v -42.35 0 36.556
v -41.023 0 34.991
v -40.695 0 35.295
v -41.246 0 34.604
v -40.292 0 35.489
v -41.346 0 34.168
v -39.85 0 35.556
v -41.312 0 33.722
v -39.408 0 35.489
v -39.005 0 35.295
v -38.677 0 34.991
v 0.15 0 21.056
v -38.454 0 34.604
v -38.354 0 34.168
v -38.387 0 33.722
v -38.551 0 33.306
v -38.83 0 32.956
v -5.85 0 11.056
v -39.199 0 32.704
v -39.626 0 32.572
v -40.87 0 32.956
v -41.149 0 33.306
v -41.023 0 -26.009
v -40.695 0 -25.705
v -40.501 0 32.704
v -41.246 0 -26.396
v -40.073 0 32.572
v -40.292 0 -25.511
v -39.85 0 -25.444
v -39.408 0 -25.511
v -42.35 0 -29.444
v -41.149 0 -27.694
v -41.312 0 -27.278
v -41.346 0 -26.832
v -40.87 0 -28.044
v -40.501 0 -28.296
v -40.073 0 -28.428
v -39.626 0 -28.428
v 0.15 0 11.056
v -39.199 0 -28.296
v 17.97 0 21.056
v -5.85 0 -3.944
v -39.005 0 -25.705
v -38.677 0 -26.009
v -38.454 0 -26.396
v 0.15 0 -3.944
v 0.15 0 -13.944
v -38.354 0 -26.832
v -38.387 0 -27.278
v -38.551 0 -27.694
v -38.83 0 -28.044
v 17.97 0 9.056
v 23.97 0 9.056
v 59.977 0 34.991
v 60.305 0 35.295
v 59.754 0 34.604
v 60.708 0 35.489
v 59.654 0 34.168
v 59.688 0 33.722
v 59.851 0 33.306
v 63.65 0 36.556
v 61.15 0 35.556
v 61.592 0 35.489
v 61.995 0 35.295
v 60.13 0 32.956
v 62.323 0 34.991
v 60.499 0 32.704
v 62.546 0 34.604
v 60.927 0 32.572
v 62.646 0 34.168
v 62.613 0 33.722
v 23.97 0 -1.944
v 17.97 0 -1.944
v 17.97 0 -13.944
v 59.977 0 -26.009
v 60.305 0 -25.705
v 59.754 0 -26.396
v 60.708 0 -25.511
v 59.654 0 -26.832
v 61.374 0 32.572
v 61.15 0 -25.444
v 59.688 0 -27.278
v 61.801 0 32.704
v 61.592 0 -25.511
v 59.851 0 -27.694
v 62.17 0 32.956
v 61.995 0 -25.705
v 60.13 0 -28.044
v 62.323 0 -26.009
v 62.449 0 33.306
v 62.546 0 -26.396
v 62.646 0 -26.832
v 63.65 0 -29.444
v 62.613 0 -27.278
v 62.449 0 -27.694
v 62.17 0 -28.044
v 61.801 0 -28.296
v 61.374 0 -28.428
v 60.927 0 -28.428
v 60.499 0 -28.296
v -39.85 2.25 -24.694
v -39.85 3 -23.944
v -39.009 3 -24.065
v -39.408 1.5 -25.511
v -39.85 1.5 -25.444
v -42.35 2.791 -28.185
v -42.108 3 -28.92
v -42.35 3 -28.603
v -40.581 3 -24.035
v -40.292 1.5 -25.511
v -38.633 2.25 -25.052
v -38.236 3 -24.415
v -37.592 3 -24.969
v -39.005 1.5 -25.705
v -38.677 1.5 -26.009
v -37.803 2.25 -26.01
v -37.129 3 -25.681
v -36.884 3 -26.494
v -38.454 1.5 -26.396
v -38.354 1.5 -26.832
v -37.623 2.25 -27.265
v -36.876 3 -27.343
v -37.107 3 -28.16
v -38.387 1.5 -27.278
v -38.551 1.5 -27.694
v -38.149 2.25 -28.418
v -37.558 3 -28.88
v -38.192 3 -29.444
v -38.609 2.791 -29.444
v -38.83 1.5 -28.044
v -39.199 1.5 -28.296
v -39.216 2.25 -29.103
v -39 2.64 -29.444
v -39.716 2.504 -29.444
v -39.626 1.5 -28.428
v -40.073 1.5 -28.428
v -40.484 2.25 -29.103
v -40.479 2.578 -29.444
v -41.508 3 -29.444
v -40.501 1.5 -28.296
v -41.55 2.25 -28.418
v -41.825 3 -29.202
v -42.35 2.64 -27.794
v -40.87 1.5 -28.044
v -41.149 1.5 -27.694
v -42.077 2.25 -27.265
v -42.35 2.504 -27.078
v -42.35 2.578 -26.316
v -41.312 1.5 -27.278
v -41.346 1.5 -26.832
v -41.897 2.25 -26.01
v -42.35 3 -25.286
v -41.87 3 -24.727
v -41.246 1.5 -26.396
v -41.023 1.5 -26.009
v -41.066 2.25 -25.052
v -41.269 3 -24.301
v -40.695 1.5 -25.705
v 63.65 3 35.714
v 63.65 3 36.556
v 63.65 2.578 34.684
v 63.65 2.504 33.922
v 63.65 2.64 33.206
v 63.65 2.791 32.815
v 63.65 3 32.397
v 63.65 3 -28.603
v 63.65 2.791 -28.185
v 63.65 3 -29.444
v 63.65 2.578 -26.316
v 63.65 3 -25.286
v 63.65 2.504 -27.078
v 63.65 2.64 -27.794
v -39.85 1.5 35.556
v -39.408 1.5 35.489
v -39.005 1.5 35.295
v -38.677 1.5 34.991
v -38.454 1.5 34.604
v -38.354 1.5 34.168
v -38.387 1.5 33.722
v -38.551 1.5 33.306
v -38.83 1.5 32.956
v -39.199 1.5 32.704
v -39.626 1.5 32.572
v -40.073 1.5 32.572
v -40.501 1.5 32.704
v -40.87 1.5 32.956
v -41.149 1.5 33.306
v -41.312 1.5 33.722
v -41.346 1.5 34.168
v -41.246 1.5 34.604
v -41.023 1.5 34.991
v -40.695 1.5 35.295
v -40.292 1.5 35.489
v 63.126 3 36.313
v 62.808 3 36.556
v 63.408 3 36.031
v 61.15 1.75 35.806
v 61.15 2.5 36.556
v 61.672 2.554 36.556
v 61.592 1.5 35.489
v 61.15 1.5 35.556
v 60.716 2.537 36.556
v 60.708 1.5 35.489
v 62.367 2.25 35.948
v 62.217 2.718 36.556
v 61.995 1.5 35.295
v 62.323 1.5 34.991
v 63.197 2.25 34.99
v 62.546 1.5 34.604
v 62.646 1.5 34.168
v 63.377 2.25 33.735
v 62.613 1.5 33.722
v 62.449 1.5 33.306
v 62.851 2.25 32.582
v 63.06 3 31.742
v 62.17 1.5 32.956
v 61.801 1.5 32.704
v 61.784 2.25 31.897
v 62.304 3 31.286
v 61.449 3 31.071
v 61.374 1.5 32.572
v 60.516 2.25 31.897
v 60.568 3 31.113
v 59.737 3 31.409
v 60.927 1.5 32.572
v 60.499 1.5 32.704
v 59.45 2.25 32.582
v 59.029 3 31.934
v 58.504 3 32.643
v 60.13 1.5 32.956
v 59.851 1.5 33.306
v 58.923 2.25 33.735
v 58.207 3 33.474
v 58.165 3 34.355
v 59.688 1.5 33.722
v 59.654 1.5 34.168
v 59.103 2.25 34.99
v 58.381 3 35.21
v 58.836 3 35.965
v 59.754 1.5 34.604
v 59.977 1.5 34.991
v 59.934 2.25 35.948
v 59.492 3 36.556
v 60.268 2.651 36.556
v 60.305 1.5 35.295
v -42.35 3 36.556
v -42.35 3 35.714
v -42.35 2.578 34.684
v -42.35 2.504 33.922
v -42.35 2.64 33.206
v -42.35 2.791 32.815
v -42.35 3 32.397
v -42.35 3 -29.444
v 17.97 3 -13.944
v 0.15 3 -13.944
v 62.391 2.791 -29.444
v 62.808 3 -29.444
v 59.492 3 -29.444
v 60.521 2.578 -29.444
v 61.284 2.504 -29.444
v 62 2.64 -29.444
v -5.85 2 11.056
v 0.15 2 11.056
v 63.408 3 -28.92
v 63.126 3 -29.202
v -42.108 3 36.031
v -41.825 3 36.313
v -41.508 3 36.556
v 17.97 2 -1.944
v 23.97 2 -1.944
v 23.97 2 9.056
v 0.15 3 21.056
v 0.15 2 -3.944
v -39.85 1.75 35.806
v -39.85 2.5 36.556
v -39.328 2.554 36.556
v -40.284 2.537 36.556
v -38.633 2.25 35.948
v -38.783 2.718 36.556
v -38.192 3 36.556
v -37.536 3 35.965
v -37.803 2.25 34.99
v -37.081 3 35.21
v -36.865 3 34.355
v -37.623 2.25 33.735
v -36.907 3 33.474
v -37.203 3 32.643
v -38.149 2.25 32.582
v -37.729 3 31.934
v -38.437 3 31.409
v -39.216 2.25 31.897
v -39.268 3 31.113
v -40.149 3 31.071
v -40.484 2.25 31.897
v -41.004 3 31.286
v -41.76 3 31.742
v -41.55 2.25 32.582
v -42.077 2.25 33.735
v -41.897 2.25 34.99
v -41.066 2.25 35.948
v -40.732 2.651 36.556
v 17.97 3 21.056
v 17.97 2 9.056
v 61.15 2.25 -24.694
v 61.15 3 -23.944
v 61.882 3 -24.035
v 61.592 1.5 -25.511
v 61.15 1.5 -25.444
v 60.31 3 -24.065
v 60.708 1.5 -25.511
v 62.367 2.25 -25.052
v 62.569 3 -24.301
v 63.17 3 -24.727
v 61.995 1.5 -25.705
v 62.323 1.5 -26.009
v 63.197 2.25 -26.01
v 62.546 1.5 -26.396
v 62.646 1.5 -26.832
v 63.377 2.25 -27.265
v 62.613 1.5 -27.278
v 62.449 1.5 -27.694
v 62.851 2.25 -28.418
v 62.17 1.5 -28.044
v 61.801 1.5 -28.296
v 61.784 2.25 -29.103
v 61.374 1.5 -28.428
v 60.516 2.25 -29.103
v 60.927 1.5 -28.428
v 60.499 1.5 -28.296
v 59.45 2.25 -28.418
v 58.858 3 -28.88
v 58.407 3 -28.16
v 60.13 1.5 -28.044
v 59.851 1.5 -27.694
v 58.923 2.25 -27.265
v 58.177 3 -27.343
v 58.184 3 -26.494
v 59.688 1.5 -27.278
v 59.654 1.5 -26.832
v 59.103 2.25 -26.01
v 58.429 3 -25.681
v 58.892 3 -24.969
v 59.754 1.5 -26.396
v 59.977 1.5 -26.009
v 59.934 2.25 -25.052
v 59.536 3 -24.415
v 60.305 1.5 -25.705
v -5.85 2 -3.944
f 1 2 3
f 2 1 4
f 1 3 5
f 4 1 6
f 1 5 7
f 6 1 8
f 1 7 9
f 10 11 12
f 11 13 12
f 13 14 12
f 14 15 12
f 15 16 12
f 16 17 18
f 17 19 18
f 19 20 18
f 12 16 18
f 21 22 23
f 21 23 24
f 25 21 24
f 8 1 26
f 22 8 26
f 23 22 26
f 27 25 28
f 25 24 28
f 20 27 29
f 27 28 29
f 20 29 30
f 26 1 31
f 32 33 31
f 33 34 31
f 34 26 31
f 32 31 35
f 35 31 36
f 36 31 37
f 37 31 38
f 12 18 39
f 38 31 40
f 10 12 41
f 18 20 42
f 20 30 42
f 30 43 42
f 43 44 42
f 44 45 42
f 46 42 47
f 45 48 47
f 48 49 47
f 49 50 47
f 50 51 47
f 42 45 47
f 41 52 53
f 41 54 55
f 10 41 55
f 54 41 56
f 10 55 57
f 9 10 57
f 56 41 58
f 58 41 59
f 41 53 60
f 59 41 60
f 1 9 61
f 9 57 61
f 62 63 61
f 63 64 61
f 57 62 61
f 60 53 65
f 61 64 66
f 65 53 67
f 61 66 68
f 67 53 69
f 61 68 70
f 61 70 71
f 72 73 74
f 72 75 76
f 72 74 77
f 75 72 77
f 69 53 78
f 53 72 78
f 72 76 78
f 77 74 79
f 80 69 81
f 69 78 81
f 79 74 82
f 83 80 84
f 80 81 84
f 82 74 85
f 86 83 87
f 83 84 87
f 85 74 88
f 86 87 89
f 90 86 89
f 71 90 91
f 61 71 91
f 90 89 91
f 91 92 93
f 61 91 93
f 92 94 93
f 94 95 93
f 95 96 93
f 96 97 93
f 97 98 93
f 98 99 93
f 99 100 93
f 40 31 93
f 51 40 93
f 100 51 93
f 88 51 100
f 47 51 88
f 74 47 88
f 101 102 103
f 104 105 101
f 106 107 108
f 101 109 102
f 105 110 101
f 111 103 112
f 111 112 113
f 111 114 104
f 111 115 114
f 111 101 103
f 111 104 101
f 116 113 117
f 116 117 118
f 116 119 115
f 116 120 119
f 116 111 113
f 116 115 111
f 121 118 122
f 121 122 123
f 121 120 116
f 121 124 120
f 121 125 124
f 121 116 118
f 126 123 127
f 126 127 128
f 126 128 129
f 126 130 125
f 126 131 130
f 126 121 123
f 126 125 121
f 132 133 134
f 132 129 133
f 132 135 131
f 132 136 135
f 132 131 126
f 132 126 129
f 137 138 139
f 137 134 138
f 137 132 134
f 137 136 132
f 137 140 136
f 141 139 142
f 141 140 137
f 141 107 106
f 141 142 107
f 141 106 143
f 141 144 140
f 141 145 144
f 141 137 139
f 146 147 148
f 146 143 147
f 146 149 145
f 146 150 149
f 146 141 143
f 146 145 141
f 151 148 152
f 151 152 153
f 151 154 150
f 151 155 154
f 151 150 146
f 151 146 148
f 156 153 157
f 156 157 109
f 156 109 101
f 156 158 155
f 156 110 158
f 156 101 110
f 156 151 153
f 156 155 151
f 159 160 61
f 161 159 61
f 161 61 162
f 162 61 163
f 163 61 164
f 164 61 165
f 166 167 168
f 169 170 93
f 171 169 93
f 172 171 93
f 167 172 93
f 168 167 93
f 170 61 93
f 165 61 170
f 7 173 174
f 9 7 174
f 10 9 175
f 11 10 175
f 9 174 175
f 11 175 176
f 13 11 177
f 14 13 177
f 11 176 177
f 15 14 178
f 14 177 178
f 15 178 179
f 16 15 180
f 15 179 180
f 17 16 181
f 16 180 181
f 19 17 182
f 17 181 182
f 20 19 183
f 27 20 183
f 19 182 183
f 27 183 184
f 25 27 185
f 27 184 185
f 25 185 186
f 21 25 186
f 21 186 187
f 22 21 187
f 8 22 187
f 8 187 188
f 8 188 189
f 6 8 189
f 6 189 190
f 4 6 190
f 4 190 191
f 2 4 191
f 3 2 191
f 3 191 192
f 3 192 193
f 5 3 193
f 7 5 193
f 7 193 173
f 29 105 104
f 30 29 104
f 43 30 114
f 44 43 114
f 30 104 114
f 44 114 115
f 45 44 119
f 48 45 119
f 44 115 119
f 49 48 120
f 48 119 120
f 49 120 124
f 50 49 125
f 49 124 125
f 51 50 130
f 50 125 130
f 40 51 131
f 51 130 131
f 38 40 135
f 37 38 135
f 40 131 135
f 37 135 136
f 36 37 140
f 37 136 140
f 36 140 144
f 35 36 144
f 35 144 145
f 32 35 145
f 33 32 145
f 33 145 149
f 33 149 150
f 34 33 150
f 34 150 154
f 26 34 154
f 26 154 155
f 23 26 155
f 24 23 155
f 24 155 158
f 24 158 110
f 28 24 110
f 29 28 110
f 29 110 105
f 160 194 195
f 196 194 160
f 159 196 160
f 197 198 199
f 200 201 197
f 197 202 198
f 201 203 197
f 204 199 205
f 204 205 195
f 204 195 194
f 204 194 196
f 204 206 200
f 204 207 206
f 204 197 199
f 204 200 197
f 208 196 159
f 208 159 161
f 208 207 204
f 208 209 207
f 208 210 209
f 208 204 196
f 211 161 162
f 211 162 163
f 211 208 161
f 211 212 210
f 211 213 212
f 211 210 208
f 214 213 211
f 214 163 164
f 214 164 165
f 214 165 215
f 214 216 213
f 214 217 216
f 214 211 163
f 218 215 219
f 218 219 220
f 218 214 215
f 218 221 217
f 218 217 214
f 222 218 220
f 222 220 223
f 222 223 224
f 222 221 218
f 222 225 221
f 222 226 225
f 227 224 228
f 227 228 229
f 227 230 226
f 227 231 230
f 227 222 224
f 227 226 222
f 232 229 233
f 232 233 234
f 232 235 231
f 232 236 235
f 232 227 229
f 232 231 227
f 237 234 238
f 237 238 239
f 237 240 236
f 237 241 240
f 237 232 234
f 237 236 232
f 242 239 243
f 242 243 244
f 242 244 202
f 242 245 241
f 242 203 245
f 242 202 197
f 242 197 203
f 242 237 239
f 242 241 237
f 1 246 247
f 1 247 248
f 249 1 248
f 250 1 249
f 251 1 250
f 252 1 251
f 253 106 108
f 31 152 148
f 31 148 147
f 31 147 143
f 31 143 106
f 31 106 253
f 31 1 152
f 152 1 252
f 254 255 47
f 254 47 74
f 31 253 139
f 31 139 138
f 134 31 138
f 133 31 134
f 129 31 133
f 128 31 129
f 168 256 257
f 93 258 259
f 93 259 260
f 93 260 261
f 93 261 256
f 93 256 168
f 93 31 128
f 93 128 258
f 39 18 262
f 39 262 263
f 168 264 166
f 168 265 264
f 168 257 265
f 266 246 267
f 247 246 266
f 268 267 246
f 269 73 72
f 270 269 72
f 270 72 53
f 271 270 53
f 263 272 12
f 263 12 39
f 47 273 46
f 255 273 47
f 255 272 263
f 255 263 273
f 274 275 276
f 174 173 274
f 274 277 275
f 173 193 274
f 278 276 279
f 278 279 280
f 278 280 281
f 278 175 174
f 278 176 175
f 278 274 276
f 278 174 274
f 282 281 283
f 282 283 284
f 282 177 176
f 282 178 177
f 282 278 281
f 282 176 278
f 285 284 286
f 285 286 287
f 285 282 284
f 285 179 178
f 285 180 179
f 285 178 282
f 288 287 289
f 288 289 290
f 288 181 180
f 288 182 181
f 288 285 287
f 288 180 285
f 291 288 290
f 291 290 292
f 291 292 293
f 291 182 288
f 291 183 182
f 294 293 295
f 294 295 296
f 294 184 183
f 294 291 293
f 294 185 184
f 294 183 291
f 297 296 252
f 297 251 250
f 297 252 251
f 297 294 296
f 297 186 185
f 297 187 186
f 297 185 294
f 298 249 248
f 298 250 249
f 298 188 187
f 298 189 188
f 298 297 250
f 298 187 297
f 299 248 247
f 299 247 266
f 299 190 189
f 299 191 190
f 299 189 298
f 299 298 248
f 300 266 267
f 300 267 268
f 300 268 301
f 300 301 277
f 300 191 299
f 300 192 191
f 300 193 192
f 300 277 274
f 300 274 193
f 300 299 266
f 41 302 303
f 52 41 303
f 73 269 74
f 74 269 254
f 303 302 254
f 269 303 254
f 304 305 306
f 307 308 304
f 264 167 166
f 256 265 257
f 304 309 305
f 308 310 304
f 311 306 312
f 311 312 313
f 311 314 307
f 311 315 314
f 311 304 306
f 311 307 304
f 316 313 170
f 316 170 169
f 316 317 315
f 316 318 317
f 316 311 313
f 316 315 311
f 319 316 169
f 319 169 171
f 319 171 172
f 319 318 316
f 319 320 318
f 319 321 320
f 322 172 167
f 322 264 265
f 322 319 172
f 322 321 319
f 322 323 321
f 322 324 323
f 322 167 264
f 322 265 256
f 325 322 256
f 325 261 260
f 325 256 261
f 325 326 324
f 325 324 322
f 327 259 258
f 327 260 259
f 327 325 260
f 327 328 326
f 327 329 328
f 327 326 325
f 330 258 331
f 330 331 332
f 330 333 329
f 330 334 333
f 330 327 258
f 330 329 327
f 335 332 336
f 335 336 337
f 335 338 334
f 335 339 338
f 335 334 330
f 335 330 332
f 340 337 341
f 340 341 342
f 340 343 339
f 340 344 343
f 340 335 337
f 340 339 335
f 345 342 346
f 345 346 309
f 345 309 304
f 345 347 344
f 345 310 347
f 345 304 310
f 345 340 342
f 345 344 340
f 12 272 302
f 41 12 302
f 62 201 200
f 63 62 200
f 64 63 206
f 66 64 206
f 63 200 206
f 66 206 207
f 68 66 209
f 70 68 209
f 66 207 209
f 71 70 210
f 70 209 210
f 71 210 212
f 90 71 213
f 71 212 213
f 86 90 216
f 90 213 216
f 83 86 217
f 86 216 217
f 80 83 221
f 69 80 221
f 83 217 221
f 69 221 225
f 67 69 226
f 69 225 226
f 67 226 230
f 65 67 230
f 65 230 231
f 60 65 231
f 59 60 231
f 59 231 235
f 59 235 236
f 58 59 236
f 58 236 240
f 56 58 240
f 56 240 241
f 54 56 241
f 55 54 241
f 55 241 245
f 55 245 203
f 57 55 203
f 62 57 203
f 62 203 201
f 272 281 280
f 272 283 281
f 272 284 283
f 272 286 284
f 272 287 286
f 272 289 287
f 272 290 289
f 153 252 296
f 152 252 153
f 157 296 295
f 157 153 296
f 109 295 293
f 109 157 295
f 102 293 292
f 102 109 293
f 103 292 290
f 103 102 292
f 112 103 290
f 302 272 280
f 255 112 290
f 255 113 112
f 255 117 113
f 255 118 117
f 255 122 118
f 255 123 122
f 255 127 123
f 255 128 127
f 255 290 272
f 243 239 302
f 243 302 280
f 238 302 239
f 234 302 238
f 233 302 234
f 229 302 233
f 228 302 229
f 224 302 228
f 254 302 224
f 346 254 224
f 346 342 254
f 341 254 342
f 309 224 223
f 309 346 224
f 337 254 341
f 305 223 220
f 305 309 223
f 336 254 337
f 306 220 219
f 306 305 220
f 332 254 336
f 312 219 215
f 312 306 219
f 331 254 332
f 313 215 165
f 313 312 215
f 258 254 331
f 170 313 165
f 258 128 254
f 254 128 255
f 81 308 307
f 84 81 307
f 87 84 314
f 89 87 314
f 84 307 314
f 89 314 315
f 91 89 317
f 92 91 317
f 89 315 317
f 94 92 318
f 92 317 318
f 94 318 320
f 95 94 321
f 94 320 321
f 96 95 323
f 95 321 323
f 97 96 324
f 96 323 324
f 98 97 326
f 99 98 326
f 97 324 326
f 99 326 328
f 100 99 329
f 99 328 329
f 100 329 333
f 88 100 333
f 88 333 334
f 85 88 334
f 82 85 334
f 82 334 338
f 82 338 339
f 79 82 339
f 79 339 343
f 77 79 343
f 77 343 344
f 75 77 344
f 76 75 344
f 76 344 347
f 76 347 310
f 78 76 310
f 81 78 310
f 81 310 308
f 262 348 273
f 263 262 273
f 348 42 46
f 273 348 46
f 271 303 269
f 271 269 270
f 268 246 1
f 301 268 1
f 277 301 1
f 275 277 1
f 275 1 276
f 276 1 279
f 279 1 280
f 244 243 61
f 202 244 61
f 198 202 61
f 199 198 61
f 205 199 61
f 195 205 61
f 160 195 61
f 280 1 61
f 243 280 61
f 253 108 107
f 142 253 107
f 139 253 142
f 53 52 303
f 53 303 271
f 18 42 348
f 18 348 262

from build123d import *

# Parameters (mm, degrees)
CROQUIS1_W              = 106
CROQUIS1_H              = 66
SALIENTE_EXTRUIR1_DEPTH = 3
CROQUIS2_W              = 17.819535579
CROQUIS2_H              = 35
CORTAR_EXTRUIR1_DEPTH   = 3
CROQUIS3_W              = 6
CROQUIS3_H              = 11
CROQUIS3_H_2            = 15
CORTAR_EXTRUIR2_DEPTH   = 2
CROQUIS4_R              = 1.5
CORTAR_EXTRUIR3_DEPTH   = 4
CHAFL_N1_SIZE           = 1.5


with BuildPart() as part:
    # Croquis1 → Saliente-Extruir1 (new body)
    with BuildSketch(Plane(origin=(0, 0, 0), x_dir=(1, 0, 0), z_dir=(0, 1, 0))):
        with Locations((10.650118203, -3.555555556)):
            Rectangle(CROQUIS1_W, CROQUIS1_H)
    extrude(amount=SALIENTE_EXTRUIR1_DEPTH)

    # Croquis2 → Cortar-Extruir1 (cut)
    with BuildSketch(Plane(origin=(0, 3, 0), x_dir=(1, 0, 0), z_dir=(0, 1, 0))):
        with Locations((9.059885993, -3.555555556)):
            Rectangle(CROQUIS2_W, CROQUIS2_H)
    extrude(amount=-CORTAR_EXTRUIR1_DEPTH, mode=Mode.SUBTRACT)

    # Croquis3 → Cortar-Extruir2 (cut)
    with BuildSketch(Plane.XZ):
        with Locations((20.969653782, 3.555555556)):
            Rectangle(CROQUIS3_W, CROQUIS3_H)
        with Locations((-2.849881797, 3.555555556)):
            Rectangle(CROQUIS3_W, CROQUIS3_H_2)
    extrude(amount=-CORTAR_EXTRUIR2_DEPTH, mode=Mode.SUBTRACT)

    # Croquis4 → Cortar-Extruir3 (cut)
    with BuildSketch(Plane(origin=(0, 3, 0), x_dir=(1, 0, 0), z_dir=(0, 1, 0))):
        with Locations(Location((-39.849881797, 26.944444444, 0), (0, 0, 270))):
            Circle(CROQUIS4_R)
        with Locations(Location((61.150118203, 26.944444444, 0), (0, 0, 270))):
            Circle(CROQUIS4_R)
        with Locations(Location((61.150118203, -34.055555556, 0), (0, 0, 270))):
            Circle(CROQUIS4_R)
        with Locations(Location((-39.849881797, -34.055555556, 0), (0, 0, 270))):
            Circle(CROQUIS4_R)
    extrude(amount=-CORTAR_EXTRUIR3_DEPTH, mode=Mode.SUBTRACT)

    # Chaflán1
    # the kernel refuses this chamfer: 1.5 mm, written as the material it takes off along each edge
    with BuildSketch(Plane(origin=(-39.849881797, 3, 34.055555556), x_dir=(0, 0, 1), z_dir=(-1, 0, 0))) as chafl_n1_piece_1:
        Polygon((1.5 + CHAFL_N1_SIZE, 0), (1.5, -CHAFL_N1_SIZE), (1.5, 0), align=None)
    revolve(axis=Axis((-39.849881797, 3, 34.055555556), (0, 1, 0)), mode=Mode.SUBTRACT)
    with BuildSketch(Plane(origin=(61.150118203, 3, 34.055555556), x_dir=(0, 0, 1), z_dir=(-1, 0, 0))) as chafl_n1_piece_2:
        Polygon((1.5 + CHAFL_N1_SIZE, 0), (1.5, -CHAFL_N1_SIZE), (1.5, 0), align=None)
    revolve(axis=Axis((61.150118203, 3, 34.055555556), (0, 1, 0)), mode=Mode.SUBTRACT)
    with BuildSketch(Plane(origin=(61.150118203, 3, -26.944444444), x_dir=(0, 0, 1), z_dir=(-1, 0, 0))) as chafl_n1_piece_3:
        Polygon((1.5 + CHAFL_N1_SIZE, 0), (1.5, -CHAFL_N1_SIZE), (1.5, 0), align=None)
    revolve(axis=Axis((61.150118203, 3, -26.944444444), (0, 1, 0)), mode=Mode.SUBTRACT)
    with BuildSketch(Plane(origin=(-39.849881797, 3, -26.944444444), x_dir=(0, 0, 1), z_dir=(-1, 0, 0))) as chafl_n1_piece_4:
        Polygon((1.5 + CHAFL_N1_SIZE, 0), (1.5, -CHAFL_N1_SIZE), (1.5, 0), align=None)
    revolve(axis=Axis((-39.849881797, 3, -26.944444444), (0, 1, 0)), mode=Mode.SUBTRACT)


solid = part.part
